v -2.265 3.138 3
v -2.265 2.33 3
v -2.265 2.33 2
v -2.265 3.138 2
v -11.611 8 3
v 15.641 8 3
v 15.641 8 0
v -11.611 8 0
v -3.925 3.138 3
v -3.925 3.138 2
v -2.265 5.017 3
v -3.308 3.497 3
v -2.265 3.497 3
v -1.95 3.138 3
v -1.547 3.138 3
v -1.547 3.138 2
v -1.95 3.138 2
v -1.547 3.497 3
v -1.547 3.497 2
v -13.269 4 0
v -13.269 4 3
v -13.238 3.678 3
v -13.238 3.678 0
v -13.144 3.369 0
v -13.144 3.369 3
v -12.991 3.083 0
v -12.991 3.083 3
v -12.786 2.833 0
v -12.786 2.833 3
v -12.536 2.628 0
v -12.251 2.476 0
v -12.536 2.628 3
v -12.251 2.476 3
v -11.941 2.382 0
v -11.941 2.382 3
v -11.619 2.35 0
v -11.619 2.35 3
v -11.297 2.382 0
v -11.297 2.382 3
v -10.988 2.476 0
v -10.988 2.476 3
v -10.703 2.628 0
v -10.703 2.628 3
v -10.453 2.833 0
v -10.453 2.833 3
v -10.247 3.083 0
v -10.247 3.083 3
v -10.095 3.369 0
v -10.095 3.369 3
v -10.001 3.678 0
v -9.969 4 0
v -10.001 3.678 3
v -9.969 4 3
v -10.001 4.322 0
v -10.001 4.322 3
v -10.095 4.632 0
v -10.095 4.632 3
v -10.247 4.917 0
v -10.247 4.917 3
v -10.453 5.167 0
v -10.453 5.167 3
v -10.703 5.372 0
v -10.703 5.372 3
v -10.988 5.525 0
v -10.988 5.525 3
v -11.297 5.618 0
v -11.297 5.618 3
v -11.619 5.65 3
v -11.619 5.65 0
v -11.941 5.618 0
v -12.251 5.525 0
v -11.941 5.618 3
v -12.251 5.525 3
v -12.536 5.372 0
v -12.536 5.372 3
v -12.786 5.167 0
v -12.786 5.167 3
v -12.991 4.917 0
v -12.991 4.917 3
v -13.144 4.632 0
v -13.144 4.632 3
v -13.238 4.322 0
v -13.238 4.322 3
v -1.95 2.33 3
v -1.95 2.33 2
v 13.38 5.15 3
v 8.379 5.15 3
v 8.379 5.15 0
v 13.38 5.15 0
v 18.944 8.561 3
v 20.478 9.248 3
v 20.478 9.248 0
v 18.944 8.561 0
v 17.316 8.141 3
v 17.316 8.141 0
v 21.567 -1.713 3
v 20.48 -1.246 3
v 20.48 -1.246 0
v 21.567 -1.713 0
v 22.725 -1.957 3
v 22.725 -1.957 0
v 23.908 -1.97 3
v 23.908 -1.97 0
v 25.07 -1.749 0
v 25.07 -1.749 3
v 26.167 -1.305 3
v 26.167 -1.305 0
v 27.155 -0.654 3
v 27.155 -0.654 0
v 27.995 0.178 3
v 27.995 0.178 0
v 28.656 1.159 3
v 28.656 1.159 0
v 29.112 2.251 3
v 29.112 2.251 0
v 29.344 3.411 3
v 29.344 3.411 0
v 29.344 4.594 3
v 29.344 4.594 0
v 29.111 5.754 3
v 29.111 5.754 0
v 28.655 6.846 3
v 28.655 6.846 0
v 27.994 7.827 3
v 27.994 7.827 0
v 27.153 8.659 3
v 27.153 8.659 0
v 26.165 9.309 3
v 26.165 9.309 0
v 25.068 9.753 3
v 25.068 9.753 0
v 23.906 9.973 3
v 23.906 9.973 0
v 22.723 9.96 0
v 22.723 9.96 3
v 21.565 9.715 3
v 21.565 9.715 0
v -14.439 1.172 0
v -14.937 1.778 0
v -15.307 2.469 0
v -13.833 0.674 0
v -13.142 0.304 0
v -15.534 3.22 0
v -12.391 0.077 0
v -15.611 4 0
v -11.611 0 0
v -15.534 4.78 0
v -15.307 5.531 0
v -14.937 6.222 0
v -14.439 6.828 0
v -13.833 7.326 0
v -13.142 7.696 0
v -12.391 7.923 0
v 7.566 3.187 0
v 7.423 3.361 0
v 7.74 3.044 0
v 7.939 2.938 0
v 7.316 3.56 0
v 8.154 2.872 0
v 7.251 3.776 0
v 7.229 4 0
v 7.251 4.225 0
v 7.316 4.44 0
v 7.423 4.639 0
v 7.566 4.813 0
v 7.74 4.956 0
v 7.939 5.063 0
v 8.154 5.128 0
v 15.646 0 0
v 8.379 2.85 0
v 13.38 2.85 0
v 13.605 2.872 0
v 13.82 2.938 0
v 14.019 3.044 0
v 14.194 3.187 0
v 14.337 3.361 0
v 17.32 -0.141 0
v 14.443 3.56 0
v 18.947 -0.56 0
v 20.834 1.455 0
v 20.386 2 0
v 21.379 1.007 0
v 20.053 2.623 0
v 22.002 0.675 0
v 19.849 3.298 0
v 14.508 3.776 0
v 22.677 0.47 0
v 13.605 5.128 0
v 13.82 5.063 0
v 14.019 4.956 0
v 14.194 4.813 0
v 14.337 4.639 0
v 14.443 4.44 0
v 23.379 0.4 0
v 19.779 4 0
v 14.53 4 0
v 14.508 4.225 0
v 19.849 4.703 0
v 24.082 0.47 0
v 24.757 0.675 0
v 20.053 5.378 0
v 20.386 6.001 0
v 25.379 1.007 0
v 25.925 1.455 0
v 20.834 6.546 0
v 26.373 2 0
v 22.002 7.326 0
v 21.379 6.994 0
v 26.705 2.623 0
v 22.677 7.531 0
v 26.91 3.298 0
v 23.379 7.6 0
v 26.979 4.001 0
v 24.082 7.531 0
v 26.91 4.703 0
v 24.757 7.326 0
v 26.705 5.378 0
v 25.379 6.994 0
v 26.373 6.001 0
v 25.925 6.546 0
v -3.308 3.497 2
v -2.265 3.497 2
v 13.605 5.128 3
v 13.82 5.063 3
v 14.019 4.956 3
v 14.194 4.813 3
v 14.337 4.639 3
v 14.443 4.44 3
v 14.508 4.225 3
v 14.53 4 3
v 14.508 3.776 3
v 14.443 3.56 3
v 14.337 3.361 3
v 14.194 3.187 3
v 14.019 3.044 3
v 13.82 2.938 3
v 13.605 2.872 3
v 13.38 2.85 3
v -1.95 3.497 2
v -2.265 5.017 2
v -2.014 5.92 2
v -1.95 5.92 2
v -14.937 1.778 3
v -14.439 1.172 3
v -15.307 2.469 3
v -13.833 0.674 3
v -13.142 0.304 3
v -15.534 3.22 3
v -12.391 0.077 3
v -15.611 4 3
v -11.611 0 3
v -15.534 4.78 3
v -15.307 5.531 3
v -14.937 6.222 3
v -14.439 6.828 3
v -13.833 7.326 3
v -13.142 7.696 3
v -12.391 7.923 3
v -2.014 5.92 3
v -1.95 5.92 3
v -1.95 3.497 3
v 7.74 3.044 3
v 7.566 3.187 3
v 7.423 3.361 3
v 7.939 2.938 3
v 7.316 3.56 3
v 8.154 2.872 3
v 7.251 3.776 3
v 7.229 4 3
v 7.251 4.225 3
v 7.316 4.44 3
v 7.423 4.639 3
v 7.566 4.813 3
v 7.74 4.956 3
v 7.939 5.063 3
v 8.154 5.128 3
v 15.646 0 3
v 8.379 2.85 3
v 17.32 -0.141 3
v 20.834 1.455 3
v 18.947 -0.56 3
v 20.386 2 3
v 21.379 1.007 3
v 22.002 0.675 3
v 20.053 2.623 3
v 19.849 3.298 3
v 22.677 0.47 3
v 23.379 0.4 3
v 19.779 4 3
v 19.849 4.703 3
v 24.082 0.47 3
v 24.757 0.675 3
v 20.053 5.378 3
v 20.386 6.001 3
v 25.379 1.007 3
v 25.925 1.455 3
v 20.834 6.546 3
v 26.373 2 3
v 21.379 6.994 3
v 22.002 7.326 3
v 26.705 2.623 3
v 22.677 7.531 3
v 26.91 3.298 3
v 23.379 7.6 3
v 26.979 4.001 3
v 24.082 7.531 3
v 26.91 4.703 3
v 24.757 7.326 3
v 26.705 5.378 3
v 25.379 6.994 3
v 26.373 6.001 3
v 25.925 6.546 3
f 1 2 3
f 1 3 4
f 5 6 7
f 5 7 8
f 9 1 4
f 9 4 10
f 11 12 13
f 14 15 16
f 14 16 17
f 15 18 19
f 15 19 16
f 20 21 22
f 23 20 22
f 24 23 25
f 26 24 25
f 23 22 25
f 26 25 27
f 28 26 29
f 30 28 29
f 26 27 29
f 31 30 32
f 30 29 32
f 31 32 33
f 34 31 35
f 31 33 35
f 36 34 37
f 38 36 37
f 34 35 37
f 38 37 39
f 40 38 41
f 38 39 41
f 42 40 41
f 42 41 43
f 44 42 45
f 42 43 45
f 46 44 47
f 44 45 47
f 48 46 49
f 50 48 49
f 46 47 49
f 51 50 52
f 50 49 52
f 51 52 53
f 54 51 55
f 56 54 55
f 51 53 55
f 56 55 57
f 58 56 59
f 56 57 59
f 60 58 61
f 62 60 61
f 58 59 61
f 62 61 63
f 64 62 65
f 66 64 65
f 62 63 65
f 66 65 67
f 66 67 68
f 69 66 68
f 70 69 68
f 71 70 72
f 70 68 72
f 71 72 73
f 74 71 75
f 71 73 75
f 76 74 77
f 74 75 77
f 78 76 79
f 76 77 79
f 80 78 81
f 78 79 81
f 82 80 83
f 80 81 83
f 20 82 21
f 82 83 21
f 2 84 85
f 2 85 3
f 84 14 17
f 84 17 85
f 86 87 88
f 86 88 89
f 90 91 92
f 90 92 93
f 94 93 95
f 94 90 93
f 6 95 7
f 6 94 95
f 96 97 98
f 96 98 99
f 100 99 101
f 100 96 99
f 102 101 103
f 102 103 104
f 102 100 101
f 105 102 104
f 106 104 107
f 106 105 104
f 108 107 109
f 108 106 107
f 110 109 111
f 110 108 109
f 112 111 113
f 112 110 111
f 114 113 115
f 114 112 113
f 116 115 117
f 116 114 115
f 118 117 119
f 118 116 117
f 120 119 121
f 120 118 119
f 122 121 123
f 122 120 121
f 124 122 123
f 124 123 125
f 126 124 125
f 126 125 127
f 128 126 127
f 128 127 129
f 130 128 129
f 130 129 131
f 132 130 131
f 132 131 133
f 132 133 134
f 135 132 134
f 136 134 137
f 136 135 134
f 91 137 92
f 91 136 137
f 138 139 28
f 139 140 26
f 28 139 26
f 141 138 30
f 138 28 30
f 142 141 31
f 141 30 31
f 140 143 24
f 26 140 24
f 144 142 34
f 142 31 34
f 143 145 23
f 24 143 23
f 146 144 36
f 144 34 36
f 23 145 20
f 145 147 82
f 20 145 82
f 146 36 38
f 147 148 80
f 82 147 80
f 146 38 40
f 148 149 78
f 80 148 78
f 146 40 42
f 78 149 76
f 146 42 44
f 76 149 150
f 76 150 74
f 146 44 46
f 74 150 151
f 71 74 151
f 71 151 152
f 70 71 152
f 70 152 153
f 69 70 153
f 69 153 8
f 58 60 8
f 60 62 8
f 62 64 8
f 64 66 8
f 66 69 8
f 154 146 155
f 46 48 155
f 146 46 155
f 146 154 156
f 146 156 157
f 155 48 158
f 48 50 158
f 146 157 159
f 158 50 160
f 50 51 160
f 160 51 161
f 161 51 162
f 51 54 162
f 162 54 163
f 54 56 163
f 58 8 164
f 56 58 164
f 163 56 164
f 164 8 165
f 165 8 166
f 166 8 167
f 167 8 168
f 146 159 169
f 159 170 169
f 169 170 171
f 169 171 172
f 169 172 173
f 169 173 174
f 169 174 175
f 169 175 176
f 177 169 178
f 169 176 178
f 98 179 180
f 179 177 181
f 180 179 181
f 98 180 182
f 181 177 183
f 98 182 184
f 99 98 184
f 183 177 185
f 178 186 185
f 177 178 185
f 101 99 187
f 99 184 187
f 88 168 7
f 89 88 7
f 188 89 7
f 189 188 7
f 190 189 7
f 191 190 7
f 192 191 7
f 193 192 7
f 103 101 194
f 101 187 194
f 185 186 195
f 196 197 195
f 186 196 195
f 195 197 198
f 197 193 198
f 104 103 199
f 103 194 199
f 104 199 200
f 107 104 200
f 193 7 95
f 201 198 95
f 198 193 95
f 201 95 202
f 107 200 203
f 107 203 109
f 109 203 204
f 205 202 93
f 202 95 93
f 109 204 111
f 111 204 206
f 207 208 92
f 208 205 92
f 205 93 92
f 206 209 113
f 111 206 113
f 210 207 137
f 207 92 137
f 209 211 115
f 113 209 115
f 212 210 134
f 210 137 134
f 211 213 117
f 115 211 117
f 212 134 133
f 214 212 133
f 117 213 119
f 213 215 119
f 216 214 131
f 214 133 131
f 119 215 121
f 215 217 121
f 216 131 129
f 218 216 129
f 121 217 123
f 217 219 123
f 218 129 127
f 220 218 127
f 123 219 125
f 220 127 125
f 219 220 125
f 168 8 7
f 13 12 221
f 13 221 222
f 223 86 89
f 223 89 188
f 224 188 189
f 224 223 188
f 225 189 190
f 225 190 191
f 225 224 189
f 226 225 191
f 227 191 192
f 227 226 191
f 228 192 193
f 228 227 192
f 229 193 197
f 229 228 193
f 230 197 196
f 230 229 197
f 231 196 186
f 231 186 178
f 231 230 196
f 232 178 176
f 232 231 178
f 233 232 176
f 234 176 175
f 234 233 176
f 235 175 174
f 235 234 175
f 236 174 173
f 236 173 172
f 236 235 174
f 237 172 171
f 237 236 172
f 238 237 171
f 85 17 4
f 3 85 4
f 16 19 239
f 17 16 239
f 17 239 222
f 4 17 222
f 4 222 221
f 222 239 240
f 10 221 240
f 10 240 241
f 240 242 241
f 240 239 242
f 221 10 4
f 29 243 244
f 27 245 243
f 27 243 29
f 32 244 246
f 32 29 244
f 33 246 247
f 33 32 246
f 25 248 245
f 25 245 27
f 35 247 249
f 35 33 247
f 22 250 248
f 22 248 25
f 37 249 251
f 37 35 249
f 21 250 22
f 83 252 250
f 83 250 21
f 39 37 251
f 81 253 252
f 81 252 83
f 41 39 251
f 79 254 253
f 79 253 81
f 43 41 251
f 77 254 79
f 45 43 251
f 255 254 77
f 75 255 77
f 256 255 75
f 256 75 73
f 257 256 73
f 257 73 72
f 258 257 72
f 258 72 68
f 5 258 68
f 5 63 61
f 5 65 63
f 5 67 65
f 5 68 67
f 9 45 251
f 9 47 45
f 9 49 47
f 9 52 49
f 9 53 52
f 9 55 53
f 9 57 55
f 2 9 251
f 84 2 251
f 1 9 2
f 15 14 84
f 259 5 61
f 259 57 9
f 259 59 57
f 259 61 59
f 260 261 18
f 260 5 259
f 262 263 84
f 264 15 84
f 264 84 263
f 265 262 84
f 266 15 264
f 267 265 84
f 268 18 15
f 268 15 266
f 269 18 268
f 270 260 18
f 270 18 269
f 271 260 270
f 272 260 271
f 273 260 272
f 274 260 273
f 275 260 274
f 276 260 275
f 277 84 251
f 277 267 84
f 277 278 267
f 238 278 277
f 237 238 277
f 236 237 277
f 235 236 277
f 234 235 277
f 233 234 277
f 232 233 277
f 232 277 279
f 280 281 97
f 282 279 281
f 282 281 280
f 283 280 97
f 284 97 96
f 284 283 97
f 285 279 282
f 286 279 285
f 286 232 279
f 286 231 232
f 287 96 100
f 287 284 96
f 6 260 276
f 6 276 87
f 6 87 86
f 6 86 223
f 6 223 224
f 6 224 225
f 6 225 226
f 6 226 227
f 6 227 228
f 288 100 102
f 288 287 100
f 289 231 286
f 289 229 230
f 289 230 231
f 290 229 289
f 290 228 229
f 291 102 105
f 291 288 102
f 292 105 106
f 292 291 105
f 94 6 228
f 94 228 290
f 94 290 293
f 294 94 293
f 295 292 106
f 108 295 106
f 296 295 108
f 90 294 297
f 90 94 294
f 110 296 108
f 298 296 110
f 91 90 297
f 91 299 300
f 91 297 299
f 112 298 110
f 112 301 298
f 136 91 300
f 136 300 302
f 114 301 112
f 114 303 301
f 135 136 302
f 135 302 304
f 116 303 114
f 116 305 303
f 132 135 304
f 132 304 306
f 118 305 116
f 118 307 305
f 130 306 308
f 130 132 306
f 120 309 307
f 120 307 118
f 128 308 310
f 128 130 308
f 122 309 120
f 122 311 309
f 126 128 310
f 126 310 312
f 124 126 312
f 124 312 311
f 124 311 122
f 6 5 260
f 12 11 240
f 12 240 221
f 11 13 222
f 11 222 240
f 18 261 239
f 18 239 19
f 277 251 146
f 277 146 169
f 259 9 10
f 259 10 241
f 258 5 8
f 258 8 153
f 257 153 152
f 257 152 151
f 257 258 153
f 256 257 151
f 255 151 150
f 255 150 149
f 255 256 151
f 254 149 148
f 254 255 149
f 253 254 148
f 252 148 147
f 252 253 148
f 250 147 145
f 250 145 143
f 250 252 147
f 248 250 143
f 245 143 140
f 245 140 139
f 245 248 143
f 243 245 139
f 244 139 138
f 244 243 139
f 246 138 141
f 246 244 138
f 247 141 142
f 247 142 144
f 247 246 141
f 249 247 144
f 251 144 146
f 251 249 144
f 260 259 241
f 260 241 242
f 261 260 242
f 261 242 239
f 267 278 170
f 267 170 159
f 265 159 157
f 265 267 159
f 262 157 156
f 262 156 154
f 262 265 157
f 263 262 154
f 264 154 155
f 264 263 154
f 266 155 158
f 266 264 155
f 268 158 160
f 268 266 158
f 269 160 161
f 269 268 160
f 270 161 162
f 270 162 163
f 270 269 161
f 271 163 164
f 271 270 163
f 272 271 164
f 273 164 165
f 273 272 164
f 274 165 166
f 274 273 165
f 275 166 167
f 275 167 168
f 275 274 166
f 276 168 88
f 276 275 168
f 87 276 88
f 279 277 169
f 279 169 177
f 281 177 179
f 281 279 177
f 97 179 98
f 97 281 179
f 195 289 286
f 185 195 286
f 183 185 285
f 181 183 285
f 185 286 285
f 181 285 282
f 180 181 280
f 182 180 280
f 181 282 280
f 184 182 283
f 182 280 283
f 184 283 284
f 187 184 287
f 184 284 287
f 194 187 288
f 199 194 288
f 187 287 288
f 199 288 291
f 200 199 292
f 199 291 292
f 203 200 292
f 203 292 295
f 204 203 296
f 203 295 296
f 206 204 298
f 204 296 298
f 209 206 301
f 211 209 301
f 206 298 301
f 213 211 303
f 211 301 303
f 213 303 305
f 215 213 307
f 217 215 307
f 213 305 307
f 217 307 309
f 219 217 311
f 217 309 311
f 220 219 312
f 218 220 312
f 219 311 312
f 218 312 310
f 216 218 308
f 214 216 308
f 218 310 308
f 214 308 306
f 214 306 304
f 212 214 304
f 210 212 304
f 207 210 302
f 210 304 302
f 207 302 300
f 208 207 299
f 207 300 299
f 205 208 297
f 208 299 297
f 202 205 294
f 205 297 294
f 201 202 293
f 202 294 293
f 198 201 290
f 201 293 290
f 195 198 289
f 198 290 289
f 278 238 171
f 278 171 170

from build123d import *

# Parameters (mm, degrees)
SKETCH_1_R          = 1.65
SKETCH_1_R_2        = 3.6
EXTRUDE_1_DEPTH     = 3
CUT_EXTRUDE_1_DEPTH = 1


with BuildPart() as part:
    # 草图1 → 凸台-拉伸1 (new body)
    with BuildSketch(Plane.XY.offset(3)):
        with BuildLine():
            Line((15.64082314, 8), (-11.611020882, 8))
            ThreePointArc((-11.611020882, 8), (-15.611020882, 4), (-11.611020882, 0))
            Line((-11.611020882, 0), (15.646226321, 0))
            ThreePointArc((15.646226321, 0), (18.142339112, -0.316538794), (20.480428598, -1.246115814))
            ThreePointArc((20.480428598, -1.246115814), (29.372947843, 4.002649377), (20.478403544, 9.247982185))
            ThreePointArc((20.478403544, 9.247982185), (18.13880451, 8.317020651), (15.64082314, 8))
        make_face()
        with Locations(Location((-11.619385977, 4.000182729, 0), (0, 0, 180))):
            Circle(SKETCH_1_R, mode=Mode.SUBTRACT)
        with Locations(Location((23.379334845, 4.0005, 0), (0, 0, 180))):
            Circle(SKETCH_1_R_2, mode=Mode.SUBTRACT)
        with BuildLine():
            Line((13.380380647, 2.850266624), (8.378847398, 2.850266624))
            ThreePointArc((8.378847398, 2.850266624), (7.228847398, 4.000266624), (8.378847398, 5.150266624))
            Line((8.378847398, 5.150266624), (13.380380647, 5.150266624))
            ThreePointArc((13.380380647, 5.150266624), (14.530380647, 4.000266624), (13.380380647, 2.850266624))
        make_face(mode=Mode.SUBTRACT)
    extrude(amount=-EXTRUDE_1_DEPTH)

    # 草图2 → 切除-拉伸1 (cut)
    with BuildSketch(Plane.XY.offset(3)):
        Polygon((-2.014219225, 5.919649072), (-1.950417142, 5.919649072), (-1.950417142, 3.496572149), (-1.546570988, 3.496572149), (-1.546570988, 3.13759779), (-1.950417142, 3.13759779), (-1.950417142, 2.329905482), (-2.264519706, 2.329905482), (-2.264519706, 3.13759779), (-3.924776116, 3.13759779), align=None)
        Polygon((-2.264519706, 3.496572149), (-2.264519706, 5.0166042), (-3.307788937, 3.496572149), align=None, mode=Mode.SUBTRACT)
    extrude(amount=-CUT_EXTRUDE_1_DEPTH, mode=Mode.SUBTRACT)


solid = part.part
